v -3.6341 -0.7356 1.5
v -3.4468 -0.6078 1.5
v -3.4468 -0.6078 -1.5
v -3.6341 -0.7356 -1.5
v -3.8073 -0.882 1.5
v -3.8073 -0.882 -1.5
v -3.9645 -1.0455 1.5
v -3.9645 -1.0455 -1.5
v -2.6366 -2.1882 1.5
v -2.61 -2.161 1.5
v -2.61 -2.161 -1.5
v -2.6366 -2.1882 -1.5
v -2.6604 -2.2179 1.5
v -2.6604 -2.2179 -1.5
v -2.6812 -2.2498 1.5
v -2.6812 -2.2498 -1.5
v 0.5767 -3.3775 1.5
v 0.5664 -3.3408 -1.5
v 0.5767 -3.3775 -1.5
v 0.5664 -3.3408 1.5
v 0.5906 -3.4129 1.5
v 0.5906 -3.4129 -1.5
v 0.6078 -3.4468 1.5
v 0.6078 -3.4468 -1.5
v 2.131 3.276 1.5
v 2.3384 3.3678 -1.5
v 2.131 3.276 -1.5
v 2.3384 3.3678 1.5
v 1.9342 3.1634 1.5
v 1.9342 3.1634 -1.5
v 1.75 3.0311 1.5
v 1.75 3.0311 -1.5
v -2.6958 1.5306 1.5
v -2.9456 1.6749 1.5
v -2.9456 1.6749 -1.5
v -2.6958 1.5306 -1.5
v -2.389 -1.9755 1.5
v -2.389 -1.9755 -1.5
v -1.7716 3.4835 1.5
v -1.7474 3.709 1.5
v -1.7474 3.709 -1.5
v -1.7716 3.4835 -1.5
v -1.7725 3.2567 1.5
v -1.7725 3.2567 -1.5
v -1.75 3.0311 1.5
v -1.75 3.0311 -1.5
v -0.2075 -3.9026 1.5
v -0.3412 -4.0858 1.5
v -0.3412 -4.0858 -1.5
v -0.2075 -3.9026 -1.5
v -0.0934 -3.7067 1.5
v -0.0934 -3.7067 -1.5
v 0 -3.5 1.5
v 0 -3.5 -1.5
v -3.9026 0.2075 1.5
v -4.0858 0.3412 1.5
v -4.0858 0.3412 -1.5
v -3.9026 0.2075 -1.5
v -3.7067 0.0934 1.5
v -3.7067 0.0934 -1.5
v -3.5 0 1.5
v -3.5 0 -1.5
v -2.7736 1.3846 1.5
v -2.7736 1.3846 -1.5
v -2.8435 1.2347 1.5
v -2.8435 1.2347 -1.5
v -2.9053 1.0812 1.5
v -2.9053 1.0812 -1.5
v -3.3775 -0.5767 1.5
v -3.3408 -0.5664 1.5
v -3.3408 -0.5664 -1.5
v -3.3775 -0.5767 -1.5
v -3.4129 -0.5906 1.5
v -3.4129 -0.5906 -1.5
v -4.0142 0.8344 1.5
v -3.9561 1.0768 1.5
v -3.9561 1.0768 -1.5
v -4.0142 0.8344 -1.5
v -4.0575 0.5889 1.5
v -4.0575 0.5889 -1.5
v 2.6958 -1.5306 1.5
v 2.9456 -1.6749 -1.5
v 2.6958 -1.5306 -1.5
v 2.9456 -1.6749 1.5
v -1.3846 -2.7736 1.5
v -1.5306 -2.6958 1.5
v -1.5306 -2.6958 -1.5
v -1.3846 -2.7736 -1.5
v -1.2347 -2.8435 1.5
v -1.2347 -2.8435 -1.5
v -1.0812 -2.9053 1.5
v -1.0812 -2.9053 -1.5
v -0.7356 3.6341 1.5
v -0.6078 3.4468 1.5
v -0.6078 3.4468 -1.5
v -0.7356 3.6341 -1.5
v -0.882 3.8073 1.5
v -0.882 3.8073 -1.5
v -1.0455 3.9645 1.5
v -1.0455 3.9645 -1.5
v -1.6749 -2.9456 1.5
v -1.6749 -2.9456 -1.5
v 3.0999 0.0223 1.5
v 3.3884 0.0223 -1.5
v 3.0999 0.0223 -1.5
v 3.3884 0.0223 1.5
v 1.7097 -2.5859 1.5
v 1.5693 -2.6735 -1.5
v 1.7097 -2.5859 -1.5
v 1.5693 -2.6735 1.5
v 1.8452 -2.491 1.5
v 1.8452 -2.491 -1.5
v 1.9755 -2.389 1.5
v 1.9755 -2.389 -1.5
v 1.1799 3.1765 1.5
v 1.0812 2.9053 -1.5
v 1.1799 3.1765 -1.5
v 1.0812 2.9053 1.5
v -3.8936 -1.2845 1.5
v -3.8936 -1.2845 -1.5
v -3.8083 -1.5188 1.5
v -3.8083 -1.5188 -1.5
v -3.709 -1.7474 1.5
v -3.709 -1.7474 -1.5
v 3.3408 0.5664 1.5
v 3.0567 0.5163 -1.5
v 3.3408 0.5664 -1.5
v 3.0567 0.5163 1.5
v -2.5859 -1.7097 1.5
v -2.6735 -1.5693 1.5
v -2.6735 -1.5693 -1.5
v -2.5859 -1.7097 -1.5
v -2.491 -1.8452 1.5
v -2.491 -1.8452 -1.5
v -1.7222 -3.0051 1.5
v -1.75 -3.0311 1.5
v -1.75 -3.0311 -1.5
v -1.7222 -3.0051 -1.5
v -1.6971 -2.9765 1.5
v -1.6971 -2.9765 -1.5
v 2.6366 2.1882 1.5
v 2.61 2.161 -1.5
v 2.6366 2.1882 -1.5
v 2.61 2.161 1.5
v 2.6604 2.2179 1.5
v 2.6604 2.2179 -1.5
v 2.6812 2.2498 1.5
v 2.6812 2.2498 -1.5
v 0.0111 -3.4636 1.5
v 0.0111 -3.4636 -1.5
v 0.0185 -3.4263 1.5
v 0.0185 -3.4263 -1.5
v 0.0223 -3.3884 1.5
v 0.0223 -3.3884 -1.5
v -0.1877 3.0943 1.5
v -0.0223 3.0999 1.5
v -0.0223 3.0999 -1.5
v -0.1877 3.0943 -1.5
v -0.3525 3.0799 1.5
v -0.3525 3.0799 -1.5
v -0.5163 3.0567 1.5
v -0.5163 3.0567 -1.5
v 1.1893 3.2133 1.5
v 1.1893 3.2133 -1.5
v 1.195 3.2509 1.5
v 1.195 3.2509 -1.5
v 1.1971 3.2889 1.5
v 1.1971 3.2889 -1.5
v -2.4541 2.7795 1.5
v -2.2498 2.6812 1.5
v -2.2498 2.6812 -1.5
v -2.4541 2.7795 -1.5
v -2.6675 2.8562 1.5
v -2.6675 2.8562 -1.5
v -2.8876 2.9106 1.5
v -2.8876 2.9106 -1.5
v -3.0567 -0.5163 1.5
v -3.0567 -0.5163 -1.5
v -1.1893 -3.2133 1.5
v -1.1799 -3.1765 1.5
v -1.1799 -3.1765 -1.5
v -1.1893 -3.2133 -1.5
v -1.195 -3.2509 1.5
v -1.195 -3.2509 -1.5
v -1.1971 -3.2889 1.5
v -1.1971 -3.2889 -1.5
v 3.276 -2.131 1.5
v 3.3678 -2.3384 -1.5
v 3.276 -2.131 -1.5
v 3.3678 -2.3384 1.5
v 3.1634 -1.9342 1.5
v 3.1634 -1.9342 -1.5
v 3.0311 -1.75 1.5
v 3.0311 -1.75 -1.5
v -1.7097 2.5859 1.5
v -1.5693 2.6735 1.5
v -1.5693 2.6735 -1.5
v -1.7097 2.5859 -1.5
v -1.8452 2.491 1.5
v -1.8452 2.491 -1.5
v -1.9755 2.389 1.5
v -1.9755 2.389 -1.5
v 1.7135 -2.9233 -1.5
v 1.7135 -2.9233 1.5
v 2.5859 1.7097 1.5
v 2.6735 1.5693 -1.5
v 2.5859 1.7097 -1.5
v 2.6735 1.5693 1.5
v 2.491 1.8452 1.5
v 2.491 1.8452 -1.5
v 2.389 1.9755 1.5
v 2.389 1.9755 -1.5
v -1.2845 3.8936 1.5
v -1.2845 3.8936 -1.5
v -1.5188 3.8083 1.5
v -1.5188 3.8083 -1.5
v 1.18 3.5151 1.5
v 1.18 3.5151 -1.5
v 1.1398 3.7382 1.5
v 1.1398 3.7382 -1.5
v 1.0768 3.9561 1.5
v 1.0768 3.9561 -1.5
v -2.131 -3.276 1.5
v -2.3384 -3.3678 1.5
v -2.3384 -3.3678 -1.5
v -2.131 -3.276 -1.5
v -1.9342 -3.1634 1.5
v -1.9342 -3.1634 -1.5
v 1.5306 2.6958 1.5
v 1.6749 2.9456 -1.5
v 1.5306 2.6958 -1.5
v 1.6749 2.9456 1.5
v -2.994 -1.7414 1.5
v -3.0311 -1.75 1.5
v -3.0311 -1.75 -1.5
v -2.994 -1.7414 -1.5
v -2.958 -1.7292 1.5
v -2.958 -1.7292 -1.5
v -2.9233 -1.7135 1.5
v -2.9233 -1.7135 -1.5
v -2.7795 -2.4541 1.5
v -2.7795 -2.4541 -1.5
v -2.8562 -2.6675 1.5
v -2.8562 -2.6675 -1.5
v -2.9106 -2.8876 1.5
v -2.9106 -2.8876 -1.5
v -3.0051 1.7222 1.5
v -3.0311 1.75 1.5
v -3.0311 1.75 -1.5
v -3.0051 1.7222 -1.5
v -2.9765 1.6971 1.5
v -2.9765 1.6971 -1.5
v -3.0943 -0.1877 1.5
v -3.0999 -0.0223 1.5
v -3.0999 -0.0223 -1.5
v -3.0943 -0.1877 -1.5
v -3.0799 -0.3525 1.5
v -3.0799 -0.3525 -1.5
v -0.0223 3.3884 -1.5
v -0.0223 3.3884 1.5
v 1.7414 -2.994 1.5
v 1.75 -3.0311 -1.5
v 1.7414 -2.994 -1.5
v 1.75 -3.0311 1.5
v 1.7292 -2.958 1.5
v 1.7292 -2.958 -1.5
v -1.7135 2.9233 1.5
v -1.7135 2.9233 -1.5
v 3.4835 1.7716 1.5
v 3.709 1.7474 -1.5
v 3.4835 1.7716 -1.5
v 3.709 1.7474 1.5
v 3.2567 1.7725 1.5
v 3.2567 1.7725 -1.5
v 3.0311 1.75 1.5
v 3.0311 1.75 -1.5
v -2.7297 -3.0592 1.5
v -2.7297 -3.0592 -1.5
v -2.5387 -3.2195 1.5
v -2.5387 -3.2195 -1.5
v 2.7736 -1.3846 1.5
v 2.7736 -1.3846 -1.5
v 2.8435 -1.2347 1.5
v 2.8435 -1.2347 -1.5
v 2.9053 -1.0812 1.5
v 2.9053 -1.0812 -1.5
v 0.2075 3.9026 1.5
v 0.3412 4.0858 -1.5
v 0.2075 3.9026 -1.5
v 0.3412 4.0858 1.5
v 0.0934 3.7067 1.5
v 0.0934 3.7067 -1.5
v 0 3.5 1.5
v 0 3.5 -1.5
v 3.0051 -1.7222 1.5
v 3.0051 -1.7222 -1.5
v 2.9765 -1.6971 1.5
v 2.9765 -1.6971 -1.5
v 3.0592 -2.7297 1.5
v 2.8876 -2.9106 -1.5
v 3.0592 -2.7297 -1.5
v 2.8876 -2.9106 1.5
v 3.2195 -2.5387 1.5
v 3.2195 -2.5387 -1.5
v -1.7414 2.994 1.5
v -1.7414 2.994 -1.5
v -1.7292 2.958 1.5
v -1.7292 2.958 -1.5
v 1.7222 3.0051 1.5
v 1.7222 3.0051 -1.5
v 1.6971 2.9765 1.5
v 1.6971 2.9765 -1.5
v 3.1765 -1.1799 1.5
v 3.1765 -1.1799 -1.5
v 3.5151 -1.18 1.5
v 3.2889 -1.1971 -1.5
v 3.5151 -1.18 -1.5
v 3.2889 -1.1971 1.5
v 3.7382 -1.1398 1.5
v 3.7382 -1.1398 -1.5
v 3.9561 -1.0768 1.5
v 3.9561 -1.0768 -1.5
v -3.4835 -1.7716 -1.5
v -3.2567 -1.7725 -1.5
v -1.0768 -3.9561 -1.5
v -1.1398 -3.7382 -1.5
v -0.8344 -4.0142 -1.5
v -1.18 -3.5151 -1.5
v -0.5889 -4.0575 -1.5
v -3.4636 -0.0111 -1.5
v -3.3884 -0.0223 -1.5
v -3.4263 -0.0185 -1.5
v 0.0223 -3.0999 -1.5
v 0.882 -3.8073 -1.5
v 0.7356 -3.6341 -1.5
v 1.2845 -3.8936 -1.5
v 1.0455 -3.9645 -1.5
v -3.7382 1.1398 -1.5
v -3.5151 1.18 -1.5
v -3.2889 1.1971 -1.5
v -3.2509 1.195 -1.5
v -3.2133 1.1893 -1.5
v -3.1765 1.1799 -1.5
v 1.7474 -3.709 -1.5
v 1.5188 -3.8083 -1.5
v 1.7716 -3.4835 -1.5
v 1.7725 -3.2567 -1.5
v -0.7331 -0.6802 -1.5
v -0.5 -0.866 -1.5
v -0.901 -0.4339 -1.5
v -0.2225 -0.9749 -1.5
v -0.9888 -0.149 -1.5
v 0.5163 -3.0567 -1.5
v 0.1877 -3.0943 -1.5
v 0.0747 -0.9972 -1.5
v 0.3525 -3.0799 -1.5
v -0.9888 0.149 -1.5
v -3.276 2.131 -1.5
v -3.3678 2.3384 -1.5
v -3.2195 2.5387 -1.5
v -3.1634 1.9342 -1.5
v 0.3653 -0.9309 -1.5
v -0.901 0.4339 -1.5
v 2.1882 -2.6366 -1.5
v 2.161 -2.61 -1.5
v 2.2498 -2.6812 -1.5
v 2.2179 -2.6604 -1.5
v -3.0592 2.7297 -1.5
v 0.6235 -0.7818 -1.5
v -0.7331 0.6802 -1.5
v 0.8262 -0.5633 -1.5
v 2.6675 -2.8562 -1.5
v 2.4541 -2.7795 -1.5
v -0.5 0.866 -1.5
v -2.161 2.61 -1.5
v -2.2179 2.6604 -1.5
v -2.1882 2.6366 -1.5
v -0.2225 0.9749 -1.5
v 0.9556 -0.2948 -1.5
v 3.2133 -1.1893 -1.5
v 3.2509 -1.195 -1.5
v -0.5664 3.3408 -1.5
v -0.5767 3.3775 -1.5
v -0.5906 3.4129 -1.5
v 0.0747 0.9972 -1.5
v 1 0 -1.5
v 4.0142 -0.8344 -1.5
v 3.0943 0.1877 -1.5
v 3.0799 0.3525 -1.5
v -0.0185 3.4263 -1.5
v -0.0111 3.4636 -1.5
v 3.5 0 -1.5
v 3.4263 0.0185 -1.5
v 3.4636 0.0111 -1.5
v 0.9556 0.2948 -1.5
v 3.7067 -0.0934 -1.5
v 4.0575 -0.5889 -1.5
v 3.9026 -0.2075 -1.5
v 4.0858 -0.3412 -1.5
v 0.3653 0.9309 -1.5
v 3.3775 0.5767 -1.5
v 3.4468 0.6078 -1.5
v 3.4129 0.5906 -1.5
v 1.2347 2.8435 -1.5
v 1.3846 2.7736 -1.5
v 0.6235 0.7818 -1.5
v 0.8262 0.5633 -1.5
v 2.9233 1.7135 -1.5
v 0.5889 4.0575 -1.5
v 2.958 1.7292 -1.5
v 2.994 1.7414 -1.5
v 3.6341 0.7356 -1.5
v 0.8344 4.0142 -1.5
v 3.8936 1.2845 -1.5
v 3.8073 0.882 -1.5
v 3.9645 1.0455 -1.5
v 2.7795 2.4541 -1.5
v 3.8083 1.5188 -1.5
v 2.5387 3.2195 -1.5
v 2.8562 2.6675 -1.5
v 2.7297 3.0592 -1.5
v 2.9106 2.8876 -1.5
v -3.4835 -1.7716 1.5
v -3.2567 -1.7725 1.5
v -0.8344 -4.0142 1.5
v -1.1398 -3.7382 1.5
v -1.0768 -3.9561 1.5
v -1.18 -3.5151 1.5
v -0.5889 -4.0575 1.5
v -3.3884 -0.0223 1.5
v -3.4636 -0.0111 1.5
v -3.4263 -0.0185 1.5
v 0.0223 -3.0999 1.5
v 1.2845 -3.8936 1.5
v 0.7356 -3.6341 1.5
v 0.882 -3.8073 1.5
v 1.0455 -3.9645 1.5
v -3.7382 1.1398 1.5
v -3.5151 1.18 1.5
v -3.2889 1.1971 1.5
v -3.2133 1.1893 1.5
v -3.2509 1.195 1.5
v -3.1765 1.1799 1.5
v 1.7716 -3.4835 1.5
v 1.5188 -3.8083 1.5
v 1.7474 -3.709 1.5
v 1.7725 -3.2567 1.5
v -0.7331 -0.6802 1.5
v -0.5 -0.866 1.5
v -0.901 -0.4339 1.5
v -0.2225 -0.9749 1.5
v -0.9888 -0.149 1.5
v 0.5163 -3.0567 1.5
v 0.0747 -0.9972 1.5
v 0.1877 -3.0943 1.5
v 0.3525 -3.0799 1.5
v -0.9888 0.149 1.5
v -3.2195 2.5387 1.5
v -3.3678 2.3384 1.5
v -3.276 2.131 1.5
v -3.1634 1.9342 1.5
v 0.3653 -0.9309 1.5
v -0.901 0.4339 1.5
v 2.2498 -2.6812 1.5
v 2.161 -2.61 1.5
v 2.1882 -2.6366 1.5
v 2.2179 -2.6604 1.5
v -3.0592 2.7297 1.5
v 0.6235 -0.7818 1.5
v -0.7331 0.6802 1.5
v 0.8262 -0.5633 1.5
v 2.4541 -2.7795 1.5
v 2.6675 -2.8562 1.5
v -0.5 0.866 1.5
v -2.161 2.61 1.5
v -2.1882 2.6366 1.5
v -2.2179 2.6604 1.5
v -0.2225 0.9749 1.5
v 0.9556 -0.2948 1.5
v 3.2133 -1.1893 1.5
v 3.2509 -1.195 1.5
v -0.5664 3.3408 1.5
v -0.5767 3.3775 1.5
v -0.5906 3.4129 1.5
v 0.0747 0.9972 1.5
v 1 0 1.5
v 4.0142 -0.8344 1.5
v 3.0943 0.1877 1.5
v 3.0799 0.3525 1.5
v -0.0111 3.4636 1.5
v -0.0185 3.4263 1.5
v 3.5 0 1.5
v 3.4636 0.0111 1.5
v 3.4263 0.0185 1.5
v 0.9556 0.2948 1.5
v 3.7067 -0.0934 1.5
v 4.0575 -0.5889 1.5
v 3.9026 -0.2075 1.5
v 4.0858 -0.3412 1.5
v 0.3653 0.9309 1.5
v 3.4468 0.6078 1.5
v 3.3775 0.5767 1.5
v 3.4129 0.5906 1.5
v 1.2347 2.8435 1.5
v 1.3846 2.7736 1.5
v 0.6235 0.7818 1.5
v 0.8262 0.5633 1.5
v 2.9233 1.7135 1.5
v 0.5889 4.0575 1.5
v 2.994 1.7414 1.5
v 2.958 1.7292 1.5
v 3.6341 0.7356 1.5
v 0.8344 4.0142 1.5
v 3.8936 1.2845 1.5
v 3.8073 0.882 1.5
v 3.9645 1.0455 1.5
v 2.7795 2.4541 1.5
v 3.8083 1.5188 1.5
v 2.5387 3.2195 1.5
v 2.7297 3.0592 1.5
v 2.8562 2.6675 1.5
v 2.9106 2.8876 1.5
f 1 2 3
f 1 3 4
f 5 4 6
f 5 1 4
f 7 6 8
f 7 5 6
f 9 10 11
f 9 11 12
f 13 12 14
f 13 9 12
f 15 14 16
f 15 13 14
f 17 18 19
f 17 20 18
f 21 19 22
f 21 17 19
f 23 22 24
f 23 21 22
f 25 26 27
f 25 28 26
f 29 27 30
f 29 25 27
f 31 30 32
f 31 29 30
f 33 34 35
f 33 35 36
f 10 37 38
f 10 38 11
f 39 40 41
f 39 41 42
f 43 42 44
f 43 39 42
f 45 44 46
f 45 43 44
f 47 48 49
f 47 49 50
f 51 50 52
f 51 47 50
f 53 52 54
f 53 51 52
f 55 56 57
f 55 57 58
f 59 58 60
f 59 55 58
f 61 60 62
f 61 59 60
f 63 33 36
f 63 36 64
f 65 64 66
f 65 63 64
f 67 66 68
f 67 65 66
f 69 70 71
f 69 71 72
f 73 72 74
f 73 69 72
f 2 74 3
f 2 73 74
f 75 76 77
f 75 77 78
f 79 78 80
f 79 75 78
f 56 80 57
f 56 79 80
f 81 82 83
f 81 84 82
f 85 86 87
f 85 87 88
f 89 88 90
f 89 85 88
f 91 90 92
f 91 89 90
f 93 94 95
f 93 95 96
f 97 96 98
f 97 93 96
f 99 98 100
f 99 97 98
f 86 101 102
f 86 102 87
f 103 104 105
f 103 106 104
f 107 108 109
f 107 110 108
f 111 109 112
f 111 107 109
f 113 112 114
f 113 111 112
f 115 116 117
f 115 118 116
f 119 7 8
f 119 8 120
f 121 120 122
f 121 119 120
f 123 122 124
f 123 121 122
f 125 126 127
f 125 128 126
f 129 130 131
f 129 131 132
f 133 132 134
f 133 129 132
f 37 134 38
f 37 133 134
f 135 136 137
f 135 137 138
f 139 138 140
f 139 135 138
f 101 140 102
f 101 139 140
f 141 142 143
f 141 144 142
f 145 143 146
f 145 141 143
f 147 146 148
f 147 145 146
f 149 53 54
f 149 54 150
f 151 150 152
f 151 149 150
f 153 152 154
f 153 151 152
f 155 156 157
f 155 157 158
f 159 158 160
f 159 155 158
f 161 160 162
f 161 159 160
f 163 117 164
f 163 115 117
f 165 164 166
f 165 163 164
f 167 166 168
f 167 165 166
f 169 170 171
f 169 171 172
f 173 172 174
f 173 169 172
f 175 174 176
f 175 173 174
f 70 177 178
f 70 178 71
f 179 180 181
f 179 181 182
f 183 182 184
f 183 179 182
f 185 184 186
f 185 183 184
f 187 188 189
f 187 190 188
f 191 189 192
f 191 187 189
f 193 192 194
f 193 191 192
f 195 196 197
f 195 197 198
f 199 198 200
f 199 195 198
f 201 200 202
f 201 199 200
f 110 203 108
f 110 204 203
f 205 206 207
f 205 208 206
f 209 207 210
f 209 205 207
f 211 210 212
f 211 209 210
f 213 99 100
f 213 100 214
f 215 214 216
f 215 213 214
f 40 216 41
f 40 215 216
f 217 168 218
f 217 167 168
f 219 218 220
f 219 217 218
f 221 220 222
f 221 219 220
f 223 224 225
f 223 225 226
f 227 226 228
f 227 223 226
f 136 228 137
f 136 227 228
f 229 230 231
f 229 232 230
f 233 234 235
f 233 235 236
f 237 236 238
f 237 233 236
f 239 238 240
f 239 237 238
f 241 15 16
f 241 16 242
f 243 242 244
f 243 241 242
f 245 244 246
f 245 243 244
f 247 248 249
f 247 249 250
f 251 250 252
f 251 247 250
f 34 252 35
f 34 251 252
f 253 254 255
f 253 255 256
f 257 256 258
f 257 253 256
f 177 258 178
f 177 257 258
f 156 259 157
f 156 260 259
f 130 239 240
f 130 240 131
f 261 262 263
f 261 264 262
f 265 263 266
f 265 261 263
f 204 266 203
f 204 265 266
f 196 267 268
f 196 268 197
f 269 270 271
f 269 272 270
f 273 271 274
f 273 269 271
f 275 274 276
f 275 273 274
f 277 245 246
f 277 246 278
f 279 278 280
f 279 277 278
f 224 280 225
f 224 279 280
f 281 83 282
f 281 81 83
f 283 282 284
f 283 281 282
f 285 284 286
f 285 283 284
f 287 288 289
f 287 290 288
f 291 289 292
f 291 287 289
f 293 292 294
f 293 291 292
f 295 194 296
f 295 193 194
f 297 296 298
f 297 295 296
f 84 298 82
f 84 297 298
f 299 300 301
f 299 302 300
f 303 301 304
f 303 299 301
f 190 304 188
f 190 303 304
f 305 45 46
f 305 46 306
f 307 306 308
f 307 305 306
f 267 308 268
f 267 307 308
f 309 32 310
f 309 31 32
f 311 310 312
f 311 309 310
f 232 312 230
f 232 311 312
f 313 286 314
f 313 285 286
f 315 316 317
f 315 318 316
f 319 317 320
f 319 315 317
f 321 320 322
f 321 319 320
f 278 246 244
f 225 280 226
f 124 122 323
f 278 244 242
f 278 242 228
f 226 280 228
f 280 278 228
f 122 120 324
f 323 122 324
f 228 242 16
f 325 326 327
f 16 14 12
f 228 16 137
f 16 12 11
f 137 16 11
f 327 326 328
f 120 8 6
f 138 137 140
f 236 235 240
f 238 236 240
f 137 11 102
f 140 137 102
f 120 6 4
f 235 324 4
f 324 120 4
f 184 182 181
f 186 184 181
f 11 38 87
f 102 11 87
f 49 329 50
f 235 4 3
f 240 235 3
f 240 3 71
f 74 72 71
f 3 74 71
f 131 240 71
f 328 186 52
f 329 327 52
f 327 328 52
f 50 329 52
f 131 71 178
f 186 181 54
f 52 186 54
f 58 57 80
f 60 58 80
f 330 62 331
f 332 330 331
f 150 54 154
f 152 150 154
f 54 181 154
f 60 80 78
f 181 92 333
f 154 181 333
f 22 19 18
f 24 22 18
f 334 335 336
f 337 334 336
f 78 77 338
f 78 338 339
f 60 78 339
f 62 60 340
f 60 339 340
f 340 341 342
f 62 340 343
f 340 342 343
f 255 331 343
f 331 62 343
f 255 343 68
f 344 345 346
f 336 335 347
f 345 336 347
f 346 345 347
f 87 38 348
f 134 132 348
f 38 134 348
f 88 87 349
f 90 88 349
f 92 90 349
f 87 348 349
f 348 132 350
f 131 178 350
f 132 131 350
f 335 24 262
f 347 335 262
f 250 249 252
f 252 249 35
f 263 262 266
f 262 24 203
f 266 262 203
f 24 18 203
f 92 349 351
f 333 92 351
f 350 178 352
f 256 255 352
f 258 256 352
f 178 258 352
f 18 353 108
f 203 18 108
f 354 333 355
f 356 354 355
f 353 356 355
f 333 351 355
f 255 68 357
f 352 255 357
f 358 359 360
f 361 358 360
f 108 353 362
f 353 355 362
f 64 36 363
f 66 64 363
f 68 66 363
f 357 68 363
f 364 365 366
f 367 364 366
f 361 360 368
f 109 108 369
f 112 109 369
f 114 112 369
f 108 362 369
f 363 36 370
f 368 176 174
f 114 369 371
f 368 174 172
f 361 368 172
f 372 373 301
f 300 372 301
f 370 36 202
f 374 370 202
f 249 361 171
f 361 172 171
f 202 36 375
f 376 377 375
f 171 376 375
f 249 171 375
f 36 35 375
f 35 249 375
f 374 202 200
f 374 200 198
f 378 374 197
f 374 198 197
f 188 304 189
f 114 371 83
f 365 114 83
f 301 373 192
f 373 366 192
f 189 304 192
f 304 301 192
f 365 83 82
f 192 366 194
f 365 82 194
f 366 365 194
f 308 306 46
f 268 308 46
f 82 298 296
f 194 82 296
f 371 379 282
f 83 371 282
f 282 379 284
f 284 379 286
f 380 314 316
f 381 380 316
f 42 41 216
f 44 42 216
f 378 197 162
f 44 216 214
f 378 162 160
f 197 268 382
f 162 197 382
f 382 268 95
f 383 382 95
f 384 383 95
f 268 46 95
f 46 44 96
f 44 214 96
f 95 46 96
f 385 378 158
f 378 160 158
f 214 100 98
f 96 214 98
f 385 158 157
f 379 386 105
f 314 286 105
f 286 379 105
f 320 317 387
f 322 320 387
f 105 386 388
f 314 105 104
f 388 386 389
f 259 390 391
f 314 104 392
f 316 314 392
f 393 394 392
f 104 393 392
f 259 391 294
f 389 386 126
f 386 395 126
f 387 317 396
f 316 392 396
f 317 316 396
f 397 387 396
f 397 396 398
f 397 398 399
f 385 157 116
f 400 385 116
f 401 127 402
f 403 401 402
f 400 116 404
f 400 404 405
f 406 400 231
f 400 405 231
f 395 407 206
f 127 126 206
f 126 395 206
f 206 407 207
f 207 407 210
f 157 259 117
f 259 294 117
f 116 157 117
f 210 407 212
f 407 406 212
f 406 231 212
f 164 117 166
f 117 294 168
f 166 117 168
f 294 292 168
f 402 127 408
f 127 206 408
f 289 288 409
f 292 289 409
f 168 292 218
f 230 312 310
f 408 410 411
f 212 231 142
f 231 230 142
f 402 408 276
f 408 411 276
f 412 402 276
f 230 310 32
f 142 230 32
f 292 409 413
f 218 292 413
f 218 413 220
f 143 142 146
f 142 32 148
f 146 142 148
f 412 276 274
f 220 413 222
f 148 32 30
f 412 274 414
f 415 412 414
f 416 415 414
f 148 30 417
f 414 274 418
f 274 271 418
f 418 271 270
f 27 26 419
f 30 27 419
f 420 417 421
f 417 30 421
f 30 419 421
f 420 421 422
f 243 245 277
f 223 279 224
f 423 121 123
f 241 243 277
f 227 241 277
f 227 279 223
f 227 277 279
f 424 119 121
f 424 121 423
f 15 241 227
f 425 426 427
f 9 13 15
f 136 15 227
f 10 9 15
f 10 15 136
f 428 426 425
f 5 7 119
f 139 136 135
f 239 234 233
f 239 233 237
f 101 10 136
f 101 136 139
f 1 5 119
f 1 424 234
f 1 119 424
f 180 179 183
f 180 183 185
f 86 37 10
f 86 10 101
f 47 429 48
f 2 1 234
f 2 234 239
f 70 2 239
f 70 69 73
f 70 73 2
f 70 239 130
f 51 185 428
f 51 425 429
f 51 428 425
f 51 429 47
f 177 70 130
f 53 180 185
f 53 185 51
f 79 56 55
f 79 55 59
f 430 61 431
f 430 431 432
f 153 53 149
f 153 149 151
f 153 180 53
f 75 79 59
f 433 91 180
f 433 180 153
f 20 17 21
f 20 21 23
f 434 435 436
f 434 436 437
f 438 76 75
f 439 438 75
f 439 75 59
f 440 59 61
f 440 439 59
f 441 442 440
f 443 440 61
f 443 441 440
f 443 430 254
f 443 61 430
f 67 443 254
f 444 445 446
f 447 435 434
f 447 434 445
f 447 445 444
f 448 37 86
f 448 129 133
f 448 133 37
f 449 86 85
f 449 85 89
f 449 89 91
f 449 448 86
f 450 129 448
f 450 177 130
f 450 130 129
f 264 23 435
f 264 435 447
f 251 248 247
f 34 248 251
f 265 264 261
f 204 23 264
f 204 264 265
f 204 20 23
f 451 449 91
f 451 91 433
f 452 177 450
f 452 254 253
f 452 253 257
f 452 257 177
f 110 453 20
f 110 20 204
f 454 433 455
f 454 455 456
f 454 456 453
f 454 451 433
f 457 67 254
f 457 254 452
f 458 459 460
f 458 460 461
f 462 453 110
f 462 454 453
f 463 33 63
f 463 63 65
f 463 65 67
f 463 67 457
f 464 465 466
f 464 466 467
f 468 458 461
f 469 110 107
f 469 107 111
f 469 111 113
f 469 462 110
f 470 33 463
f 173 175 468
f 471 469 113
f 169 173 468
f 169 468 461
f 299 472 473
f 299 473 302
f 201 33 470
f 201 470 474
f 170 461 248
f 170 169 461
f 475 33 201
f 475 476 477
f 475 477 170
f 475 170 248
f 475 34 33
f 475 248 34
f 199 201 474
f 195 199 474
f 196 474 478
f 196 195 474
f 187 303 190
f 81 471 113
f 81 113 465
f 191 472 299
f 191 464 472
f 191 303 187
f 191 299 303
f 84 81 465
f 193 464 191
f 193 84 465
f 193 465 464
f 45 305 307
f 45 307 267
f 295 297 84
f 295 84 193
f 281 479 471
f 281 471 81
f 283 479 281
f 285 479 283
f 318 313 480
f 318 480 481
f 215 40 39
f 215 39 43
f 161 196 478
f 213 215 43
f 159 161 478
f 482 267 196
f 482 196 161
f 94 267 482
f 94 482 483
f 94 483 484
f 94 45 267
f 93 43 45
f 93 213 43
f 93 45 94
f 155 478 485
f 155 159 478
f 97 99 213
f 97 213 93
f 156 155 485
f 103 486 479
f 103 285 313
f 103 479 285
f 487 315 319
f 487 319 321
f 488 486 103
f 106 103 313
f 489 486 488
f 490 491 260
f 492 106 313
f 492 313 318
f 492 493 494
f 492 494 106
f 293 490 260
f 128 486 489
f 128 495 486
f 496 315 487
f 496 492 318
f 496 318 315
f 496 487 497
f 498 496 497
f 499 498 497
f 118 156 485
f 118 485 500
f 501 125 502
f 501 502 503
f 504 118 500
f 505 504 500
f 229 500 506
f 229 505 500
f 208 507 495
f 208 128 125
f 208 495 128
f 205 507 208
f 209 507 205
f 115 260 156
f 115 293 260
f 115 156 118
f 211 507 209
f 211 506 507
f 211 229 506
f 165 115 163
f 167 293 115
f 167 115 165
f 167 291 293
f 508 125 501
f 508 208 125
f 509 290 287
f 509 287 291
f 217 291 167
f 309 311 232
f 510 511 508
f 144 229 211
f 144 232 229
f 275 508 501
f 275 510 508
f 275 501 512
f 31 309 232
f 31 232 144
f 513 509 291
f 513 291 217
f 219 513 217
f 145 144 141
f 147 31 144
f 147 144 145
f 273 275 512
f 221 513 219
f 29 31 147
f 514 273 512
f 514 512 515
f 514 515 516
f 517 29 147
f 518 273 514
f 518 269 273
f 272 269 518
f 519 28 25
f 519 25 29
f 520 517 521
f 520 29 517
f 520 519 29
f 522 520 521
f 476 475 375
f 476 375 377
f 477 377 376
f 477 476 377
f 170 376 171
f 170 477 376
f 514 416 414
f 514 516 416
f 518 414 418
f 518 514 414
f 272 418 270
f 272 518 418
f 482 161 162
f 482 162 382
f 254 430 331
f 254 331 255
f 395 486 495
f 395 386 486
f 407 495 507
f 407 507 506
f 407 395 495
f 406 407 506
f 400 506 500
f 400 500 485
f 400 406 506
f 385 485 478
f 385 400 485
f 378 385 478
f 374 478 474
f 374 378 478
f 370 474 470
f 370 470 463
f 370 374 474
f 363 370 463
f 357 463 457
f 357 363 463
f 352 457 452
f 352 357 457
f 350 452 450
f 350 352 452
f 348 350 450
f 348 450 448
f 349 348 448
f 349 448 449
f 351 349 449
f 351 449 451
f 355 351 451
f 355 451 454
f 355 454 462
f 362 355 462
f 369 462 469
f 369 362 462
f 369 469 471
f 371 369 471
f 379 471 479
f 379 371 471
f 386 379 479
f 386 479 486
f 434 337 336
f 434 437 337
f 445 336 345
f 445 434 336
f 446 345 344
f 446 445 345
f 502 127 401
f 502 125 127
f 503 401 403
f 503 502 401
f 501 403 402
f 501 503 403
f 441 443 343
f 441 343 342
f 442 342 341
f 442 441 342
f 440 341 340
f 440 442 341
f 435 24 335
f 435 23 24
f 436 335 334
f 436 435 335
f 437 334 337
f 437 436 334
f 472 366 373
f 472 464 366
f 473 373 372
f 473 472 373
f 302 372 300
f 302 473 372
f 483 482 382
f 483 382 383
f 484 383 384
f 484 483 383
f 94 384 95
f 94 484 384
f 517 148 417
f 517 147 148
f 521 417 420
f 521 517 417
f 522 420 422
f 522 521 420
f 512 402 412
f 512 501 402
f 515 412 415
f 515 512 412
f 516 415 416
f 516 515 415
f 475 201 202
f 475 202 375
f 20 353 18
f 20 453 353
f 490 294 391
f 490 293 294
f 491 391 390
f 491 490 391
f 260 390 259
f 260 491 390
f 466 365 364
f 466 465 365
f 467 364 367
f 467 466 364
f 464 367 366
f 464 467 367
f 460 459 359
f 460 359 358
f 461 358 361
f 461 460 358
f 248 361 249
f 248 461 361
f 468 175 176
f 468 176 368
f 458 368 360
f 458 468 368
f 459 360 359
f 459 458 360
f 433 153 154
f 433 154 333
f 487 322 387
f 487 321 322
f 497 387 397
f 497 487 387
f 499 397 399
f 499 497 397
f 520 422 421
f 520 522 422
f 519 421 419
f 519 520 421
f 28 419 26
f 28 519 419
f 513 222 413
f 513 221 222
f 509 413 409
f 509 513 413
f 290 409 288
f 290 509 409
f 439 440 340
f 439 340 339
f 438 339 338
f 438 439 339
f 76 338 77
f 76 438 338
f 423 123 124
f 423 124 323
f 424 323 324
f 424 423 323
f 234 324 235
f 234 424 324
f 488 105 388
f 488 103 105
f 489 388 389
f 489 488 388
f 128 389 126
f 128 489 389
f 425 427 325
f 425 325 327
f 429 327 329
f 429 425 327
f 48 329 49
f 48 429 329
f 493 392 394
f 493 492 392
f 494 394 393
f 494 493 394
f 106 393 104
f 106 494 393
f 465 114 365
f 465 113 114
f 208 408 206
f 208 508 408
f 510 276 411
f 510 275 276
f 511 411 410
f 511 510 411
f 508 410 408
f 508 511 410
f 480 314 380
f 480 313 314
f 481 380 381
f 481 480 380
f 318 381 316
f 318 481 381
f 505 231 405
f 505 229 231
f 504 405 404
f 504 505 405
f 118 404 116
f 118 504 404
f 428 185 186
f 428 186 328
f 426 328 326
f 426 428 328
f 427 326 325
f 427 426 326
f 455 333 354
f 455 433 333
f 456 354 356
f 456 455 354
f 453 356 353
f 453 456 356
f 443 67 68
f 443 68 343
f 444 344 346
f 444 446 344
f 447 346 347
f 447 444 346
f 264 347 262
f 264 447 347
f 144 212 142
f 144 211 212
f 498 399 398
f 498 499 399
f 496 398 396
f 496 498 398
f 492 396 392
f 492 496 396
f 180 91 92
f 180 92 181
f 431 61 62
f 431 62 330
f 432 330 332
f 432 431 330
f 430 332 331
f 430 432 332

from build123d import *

# Parameters (mm, degrees)
SKETCH1_R           = 1
BOSS_EXTRUDE1_DEPTH = 1.5


with BuildPart() as part:
    # Sketch1 → Boss-Extrude1 (new, symmetric)
    with BuildSketch(Plane.XY):
        with BuildLine():
            Line((-0.022308457, 3.388443306), (-0.022308457, 3.09991973))
            ThreePointArc((-0.022308457, 3.09991973), (-0.270182803, 3.088203564), (-0.516325871, 3.056698807))
            Line((-0.516325871, 3.056698807), (-0.566427464, 3.340839061))
            ThreePointArc((-0.566427464, 3.340839061), (-0.583212597, 3.395348635), (-0.607768622, 3.446827136))
            ThreePointArc((-0.607768622, 3.446827136), (-0.806569619, 3.722605346), (-1.04548536, 3.964462178))
            ThreePointArc((-1.04548536, 3.964462178), (-1.402282588, 3.852739745), (-1.747418917, 3.708979257))
            ThreePointArc((-1.747418917, 3.708979257), (-1.774976418, 3.370134097), (-1.75, 3.031088913))
            ThreePointArc((-1.75, 3.031088913), (-1.735721264, 2.975869786), (-1.713541343, 2.923323754))
            Line((-1.713541343, 2.923323754), (-1.569279555, 2.673455008))
            ThreePointArc((-1.569279555, 2.673455008), (-1.778086953, 2.539371337), (-1.975500724, 2.389015883))
            Line((-1.975500724, 2.389015883), (-2.160960104, 2.610037765))
            ThreePointArc((-2.160960104, 2.610037765), (-2.202751242, 2.648851875), (-2.249756634, 2.681155551))
            ThreePointArc((-2.249756634, 2.681155551), (-2.559812453, 2.820585989), (-2.88764797, 2.910582279))
            ThreePointArc((-2.88764797, 2.910582279), (-3.140782217, 2.6354292), (-3.367798802, 2.3383608))
            ThreePointArc((-3.367798802, 2.3383608), (-3.222241717, 2.031133533), (-3.031088913, 1.75))
            ThreePointArc((-3.031088913, 1.75), (-2.991113602, 1.7093182), (-2.945632211, 1.674901963))
            Line((-2.945632211, 1.674901963), (-2.695763464, 1.530640175))
            ThreePointArc((-2.695763464, 1.530640175), (-2.80955414, 1.310116611), (-2.905341754, 1.081198083))
            Line((-2.905341754, 1.081198083), (-3.176465229, 1.179878957))
            ThreePointArc((-3.176465229, 1.179878957), (-3.232064471, 1.192597393), (-3.288924173, 1.197070502))
            ThreePointArc((-3.288924173, 1.197070502), (-3.627155608, 1.162792893), (-3.956067639, 1.076814208))
            ThreePointArc((-3.956067639, 1.076814208), (-4.037711787, 0.711957528), (-4.085779717, 0.341180455))
            ThreePointArc((-4.085779717, 0.341180455), (-3.806109951, 0.14789238), (-3.5, 0))
            ThreePointArc((-3.5, 0), (-3.445039465, -0.015243816), (-3.388443306, -0.022308457))
            Line((-3.388443306, -0.022308457), (-3.09991973, -0.022308457))
            ThreePointArc((-3.09991973, -0.022308457), (-3.088203564, -0.270182803), (-3.056698807, -0.516325871))
            Line((-3.056698807, -0.516325871), (-3.340839061, -0.566427464))
            ThreePointArc((-3.340839061, -0.566427464), (-3.395348635, -0.583212597), (-3.446827136, -0.607768622))
            ThreePointArc((-3.446827136, -0.607768622), (-3.722605346, -0.806569619), (-3.964462178, -1.04548536))
            ThreePointArc((-3.964462178, -1.04548536), (-3.852739745, -1.402282588), (-3.708979257, -1.747418917))
            ThreePointArc((-3.708979257, -1.747418917), (-3.370134097, -1.774976418), (-3.031088913, -1.75))
            ThreePointArc((-3.031088913, -1.75), (-2.975869786, -1.735721264), (-2.923323754, -1.713541343))
            Line((-2.923323754, -1.713541343), (-2.673455008, -1.569279555))
            ThreePointArc((-2.673455008, -1.569279555), (-2.539371337, -1.778086953), (-2.389015883, -1.975500724))
            Line((-2.389015883, -1.975500724), (-2.610037765, -2.160960104))
            ThreePointArc((-2.610037765, -2.160960104), (-2.648851875, -2.202751242), (-2.681155551, -2.249756634))
            ThreePointArc((-2.681155551, -2.249756634), (-2.820585989, -2.559812453), (-2.910582279, -2.88764797))
            ThreePointArc((-2.910582279, -2.88764797), (-2.6354292, -3.140782217), (-2.3383608, -3.367798802))
            ThreePointArc((-2.3383608, -3.367798802), (-2.031133533, -3.222241717), (-1.75, -3.031088913))
            ThreePointArc((-1.75, -3.031088913), (-1.7093182, -2.991113602), (-1.674901963, -2.945632211))
            Line((-1.674901963, -2.945632211), (-1.530640175, -2.695763464))
            ThreePointArc((-1.530640175, -2.695763464), (-1.310116611, -2.80955414), (-1.081198083, -2.905341754))
            Line((-1.081198083, -2.905341754), (-1.179878957, -3.176465229))
            ThreePointArc((-1.179878957, -3.176465229), (-1.192597393, -3.232064471), (-1.197070502, -3.288924173))
            ThreePointArc((-1.197070502, -3.288924173), (-1.162792893, -3.627155608), (-1.076814208, -3.956067639))
            ThreePointArc((-1.076814208, -3.956067639), (-0.711957528, -4.037711787), (-0.341180455, -4.085779717))
            ThreePointArc((-0.341180455, -4.085779717), (-0.14789238, -3.806109951), (0, -3.5))
            ThreePointArc((0, -3.5), (0.015243816, -3.445039465), (0.022308457, -3.388443306))
            Line((0.022308457, -3.388443306), (0.022308457, -3.09991973))
            ThreePointArc((0.022308457, -3.09991973), (0.270182803, -3.088203564), (0.516325871, -3.056698807))
            Line((0.516325871, -3.056698807), (0.566427464, -3.340839061))
            ThreePointArc((0.566427464, -3.340839061), (0.583212597, -3.395348635), (0.607768622, -3.446827136))
            ThreePointArc((0.607768622, -3.446827136), (0.806569619, -3.722605346), (1.04548536, -3.964462178))
            ThreePointArc((1.04548536, -3.964462178), (1.402282588, -3.852739745), (1.747418917, -3.708979257))
            ThreePointArc((1.747418917, -3.708979257), (1.774976418, -3.370134097), (1.75, -3.031088913))
            ThreePointArc((1.75, -3.031088913), (1.735721264, -2.975869786), (1.713541343, -2.923323754))
            Line((1.713541343, -2.923323754), (1.569279555, -2.673455008))
            ThreePointArc((1.569279555, -2.673455008), (1.778086953, -2.539371337), (1.975500724, -2.389015883))
            Line((1.975500724, -2.389015883), (2.160960104, -2.610037765))
            ThreePointArc((2.160960104, -2.610037765), (2.202751242, -2.648851875), (2.249756634, -2.681155551))
            ThreePointArc((2.249756634, -2.681155551), (2.559812453, -2.820585989), (2.88764797, -2.910582279))
            ThreePointArc((2.88764797, -2.910582279), (3.140782217, -2.6354292), (3.367798802, -2.3383608))
            ThreePointArc((3.367798802, -2.3383608), (3.222241717, -2.031133533), (3.031088913, -1.75))
            ThreePointArc((3.031088913, -1.75), (2.991113602, -1.7093182), (2.945632211, -1.674901963))
            Line((2.945632211, -1.674901963), (2.695763464, -1.530640175))
            ThreePointArc((2.695763464, -1.530640175), (2.80955414, -1.310116611), (2.905341754, -1.081198083))
            Line((2.905341754, -1.081198083), (3.176465229, -1.179878957))
            ThreePointArc((3.176465229, -1.179878957), (3.232064471, -1.192597393), (3.288924173, -1.197070502))
            ThreePointArc((3.288924173, -1.197070502), (3.627155608, -1.162792893), (3.956067639, -1.076814208))
            ThreePointArc((3.956067639, -1.076814208), (4.037711787, -0.711957528), (4.085779717, -0.341180455))
            ThreePointArc((4.085779717, -0.341180455), (3.806109951, -0.14789238), (3.5, 0))
            ThreePointArc((3.5, 0), (3.445039465, 0.015243816), (3.388443306, 0.022308457))
            Line((3.388443306, 0.022308457), (3.09991973, 0.022308457))
            ThreePointArc((3.09991973, 0.022308457), (3.088203564, 0.270182803), (3.056698807, 0.516325871))
            Line((3.056698807, 0.516325871), (3.340839061, 0.566427464))
            ThreePointArc((3.340839061, 0.566427464), (3.395348635, 0.583212597), (3.446827136, 0.607768622))
            ThreePointArc((3.446827136, 0.607768622), (3.722605346, 0.806569619), (3.964462178, 1.04548536))
            ThreePointArc((3.964462178, 1.04548536), (3.852739745, 1.402282588), (3.708979257, 1.747418917))
            ThreePointArc((3.708979257, 1.747418917), (3.370134097, 1.774976418), (3.031088913, 1.75))
            ThreePointArc((3.031088913, 1.75), (2.975869786, 1.735721264), (2.923323754, 1.713541343))
            Line((2.923323754, 1.713541343), (2.673455008, 1.569279555))
            ThreePointArc((2.673455008, 1.569279555), (2.539371337, 1.778086953), (2.389015883, 1.975500724))
            Line((2.389015883, 1.975500724), (2.610037765, 2.160960104))
            ThreePointArc((2.610037765, 2.160960104), (2.648851875, 2.202751242), (2.681155551, 2.249756634))
            ThreePointArc((2.681155551, 2.249756634), (2.820585989, 2.559812453), (2.910582279, 2.88764797))
            ThreePointArc((2.910582279, 2.88764797), (2.6354292, 3.140782217), (2.3383608, 3.367798802))
            ThreePointArc((2.3383608, 3.367798802), (2.031133533, 3.222241717), (1.75, 3.031088913))
            ThreePointArc((1.75, 3.031088913), (1.7093182, 2.991113602), (1.674901963, 2.945632211))
            Line((1.674901963, 2.945632211), (1.530640175, 2.695763464))
            ThreePointArc((1.530640175, 2.695763464), (1.310116611, 2.80955414), (1.081198083, 2.905341754))
            Line((1.081198083, 2.905341754), (1.179878957, 3.176465229))
            ThreePointArc((1.179878957, 3.176465229), (1.192597393, 3.232064471), (1.197070502, 3.288924173))
            ThreePointArc((1.197070502, 3.288924173), (1.162792893, 3.627155608), (1.076814208, 3.956067639))
            ThreePointArc((1.076814208, 3.956067639), (0.711957528, 4.037711787), (0.341180455, 4.085779717))
            ThreePointArc((0.341180455, 4.085779717), (0.14789238, 3.806109951), (0, 3.5))
            ThreePointArc((0, 3.5), (-0.015243816, 3.445039465), (-0.022308457, 3.388443306))
        make_face()
        Circle(SKETCH1_R, mode=Mode.SUBTRACT)
    extrude(amount=BOSS_EXTRUDE1_DEPTH, both=True)


solid = part.part
